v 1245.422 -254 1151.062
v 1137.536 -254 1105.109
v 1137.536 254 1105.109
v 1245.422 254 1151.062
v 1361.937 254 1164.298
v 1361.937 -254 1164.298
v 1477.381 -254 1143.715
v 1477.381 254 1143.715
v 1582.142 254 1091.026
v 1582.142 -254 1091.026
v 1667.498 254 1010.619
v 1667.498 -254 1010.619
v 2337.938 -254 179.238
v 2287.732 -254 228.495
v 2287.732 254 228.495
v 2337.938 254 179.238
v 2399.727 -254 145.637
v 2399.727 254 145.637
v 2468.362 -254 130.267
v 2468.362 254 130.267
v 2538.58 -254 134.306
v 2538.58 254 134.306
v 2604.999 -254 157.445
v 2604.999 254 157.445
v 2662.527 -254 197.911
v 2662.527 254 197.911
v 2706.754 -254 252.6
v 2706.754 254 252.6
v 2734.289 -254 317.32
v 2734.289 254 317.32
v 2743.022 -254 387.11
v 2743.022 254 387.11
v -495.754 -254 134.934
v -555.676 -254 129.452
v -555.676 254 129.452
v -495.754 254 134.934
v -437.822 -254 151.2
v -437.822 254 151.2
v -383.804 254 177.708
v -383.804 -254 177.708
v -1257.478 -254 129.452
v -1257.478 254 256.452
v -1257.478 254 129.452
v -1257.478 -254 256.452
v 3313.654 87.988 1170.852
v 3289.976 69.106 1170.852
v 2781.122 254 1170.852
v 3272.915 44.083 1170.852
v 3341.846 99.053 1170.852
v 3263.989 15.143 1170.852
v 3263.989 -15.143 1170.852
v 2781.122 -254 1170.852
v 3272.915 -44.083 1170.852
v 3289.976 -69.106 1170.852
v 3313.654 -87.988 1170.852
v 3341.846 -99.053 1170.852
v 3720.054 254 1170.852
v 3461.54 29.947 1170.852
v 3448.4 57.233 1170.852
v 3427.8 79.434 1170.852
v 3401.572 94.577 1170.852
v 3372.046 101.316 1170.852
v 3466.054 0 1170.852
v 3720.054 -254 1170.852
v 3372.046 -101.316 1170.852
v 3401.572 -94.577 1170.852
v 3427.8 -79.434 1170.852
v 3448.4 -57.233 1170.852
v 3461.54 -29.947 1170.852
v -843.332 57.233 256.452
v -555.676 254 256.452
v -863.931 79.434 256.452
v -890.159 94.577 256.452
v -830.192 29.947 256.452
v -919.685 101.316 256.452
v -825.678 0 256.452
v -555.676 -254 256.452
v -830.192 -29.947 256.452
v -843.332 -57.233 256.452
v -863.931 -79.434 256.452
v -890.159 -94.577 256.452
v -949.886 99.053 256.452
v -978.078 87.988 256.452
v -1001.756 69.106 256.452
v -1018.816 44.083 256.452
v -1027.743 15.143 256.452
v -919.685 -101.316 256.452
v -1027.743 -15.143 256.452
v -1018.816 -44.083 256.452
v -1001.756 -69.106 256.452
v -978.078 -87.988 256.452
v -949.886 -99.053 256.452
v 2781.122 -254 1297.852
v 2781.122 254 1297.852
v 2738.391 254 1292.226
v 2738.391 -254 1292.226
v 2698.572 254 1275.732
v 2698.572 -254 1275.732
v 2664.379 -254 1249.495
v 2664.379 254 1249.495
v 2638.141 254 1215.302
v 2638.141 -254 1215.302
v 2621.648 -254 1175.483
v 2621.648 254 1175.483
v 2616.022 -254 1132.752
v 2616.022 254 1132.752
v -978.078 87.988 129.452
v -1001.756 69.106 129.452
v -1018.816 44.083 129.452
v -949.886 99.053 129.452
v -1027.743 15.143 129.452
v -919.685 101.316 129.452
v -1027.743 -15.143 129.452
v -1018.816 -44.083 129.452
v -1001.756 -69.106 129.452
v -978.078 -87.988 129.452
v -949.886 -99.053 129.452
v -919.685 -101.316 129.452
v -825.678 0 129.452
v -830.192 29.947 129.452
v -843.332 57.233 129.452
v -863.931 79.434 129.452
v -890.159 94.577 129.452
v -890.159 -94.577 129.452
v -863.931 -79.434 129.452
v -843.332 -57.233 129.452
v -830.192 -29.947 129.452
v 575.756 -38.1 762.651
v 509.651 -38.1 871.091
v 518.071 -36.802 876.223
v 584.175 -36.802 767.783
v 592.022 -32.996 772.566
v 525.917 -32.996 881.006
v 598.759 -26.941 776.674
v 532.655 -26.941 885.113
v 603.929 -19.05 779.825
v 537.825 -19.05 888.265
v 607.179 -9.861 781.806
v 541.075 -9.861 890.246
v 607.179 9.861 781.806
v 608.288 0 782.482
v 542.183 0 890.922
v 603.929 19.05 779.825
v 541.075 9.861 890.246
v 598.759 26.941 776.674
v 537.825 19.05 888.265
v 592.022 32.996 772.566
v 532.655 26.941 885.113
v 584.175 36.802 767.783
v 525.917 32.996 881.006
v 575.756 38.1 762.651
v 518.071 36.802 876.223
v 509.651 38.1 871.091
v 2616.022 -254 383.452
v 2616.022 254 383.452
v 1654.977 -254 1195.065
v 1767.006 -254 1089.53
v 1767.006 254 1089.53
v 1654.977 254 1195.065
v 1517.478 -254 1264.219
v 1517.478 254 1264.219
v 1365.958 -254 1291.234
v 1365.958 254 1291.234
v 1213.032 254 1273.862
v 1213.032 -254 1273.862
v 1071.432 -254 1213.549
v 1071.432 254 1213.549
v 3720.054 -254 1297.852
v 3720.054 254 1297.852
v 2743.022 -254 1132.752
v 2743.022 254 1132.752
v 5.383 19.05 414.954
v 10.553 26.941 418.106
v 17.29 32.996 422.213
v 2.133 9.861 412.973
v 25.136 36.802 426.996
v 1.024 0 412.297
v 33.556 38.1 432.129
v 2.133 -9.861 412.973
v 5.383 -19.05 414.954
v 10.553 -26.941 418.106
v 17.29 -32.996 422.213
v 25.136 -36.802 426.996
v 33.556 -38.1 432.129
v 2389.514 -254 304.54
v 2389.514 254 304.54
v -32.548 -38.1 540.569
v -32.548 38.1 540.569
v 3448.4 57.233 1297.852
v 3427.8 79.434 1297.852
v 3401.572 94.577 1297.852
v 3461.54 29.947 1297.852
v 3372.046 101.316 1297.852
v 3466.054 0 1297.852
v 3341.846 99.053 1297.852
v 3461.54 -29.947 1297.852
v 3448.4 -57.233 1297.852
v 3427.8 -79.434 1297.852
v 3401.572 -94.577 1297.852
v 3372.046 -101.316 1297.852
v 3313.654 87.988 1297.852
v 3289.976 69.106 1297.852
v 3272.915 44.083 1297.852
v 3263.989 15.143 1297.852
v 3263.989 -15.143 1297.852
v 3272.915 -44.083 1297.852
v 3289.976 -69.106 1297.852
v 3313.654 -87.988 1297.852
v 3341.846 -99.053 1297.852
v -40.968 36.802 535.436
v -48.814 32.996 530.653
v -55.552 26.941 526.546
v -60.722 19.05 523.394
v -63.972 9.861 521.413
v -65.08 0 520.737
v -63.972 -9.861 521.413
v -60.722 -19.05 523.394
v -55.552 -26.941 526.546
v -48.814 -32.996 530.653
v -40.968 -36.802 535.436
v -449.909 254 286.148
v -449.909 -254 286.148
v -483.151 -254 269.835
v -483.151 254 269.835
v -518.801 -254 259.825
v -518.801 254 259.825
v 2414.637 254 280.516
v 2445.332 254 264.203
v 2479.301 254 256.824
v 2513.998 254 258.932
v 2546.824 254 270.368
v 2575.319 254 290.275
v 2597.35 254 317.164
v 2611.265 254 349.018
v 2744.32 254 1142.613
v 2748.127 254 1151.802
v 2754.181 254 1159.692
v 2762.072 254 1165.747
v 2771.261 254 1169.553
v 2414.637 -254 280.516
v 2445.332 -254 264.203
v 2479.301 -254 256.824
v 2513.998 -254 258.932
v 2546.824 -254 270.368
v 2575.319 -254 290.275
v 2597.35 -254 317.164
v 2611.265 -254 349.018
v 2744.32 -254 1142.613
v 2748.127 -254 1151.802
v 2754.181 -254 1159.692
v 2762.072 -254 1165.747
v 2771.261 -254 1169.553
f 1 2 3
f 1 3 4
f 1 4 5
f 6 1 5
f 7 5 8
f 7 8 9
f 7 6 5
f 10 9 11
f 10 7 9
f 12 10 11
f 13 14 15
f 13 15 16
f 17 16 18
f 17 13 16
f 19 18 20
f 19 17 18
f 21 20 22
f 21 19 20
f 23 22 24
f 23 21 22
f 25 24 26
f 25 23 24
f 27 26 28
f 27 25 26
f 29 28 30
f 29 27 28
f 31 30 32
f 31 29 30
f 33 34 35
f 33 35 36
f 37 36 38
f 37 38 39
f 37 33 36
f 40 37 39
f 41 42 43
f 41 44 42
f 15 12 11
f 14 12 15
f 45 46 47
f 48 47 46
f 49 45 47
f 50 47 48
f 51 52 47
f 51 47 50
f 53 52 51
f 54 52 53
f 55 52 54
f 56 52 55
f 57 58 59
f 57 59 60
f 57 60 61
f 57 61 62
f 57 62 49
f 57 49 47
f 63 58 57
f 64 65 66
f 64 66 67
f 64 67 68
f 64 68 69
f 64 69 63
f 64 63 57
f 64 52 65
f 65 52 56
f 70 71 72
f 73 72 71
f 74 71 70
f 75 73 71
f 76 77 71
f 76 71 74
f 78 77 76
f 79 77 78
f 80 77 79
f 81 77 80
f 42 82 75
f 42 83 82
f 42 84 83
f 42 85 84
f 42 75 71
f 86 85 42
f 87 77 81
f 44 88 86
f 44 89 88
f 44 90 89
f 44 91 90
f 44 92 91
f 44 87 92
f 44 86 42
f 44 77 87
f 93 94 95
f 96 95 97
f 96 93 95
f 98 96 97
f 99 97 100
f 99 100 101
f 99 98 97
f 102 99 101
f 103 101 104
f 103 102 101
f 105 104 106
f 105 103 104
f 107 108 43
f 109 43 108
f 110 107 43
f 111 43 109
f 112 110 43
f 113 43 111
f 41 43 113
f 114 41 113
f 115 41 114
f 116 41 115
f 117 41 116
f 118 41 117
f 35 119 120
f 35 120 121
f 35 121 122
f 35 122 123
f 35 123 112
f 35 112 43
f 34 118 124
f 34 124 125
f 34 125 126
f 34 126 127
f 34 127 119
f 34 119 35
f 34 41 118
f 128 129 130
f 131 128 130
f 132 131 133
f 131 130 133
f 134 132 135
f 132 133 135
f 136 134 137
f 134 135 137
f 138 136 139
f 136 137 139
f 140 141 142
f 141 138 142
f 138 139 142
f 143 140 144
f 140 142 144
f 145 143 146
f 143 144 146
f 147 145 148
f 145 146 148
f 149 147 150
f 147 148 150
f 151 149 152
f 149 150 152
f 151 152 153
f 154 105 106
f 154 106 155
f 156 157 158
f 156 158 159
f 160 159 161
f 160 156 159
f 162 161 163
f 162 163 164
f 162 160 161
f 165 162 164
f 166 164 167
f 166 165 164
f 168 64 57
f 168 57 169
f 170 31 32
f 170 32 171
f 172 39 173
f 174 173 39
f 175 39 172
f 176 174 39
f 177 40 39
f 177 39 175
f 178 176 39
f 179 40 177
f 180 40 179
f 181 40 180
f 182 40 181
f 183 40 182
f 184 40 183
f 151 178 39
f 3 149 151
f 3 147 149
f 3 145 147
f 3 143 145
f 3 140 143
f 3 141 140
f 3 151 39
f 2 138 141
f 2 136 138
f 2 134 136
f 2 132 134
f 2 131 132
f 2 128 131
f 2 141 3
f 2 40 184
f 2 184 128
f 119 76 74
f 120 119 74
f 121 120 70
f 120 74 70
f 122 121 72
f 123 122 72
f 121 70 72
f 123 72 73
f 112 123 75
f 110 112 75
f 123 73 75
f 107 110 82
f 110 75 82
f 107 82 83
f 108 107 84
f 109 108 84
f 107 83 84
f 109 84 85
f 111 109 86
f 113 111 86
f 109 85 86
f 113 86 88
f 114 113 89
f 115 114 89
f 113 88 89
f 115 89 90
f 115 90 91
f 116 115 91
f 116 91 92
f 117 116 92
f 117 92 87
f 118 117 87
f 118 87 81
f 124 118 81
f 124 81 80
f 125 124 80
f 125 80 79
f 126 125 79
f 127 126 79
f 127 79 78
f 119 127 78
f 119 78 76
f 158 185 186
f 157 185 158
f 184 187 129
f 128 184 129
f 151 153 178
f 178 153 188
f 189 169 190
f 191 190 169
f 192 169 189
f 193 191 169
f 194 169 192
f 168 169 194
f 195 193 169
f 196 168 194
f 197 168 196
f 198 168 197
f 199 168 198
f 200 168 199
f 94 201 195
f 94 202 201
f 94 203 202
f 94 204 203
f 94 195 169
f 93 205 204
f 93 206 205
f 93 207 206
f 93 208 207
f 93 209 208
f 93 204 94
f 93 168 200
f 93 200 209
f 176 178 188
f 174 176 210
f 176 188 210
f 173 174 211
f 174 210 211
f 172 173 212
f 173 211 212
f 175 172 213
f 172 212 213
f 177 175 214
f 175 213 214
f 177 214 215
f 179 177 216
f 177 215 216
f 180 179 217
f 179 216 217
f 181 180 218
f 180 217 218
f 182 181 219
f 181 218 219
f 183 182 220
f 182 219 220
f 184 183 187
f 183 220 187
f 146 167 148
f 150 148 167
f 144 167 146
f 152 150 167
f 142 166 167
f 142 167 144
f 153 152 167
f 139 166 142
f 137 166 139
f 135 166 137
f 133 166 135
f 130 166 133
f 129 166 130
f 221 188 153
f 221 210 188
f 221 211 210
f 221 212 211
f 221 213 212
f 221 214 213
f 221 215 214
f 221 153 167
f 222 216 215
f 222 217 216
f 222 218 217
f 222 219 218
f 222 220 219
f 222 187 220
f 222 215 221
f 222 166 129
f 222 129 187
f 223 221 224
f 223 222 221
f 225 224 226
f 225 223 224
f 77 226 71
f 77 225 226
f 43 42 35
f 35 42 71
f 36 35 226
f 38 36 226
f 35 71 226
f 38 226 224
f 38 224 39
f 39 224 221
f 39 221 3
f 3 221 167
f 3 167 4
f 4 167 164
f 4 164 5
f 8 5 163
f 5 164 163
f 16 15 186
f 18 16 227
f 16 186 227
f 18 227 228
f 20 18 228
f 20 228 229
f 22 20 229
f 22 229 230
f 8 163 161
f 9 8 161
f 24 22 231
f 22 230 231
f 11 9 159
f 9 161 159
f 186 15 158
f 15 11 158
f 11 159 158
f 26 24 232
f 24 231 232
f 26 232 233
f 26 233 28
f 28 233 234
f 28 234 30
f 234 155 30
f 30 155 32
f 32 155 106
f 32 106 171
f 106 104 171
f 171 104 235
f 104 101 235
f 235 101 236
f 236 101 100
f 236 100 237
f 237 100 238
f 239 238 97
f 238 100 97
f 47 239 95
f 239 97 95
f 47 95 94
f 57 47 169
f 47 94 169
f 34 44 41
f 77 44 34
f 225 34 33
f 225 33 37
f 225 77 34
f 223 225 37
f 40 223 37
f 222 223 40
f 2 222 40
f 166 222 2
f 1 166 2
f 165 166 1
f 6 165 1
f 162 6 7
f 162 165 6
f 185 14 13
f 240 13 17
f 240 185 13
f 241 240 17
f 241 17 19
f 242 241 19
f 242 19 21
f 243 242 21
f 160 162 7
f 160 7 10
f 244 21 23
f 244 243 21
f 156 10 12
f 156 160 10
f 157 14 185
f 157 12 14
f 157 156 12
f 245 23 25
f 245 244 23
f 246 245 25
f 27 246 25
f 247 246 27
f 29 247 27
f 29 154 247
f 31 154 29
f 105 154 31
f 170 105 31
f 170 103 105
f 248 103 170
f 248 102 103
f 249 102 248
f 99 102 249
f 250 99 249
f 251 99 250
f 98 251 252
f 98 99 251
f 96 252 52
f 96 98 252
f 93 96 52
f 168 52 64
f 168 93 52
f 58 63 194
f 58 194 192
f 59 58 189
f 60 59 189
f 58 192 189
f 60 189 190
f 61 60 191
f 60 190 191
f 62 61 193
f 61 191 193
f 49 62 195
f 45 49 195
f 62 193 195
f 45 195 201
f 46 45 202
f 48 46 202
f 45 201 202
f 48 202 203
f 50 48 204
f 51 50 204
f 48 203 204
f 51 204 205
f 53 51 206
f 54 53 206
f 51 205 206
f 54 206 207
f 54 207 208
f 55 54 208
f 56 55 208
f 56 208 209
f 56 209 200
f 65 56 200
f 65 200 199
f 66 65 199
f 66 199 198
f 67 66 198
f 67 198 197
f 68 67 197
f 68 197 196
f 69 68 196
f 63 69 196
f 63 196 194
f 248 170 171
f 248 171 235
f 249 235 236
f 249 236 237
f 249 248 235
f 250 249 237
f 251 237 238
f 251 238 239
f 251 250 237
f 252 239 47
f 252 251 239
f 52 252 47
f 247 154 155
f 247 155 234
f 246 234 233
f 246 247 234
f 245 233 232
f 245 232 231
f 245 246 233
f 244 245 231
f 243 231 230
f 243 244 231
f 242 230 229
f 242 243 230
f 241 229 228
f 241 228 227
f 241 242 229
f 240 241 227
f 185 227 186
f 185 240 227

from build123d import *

# Parameters (mm, degrees)
F1_DEPTH = 254
F2_R     = 101.6
F3_DEPTH = 127.027347
F4_R     = 101.6
F5_DEPTH = 1168.427347
F7_DEPTH = 2304.314569


with BuildPart() as f1:
    # F0 (on Front) → F1 (new body, symmetric)
    with BuildSketch(Plane.XZ):
        with BuildLine():
            Line((-1257.477762, 256.451588), (-1257.477762, 129.451588))
            Line((-1257.477762, 129.451588), (-555.675762, 129.451588))
            ThreePointArc((-555.675762, 129.451588), (-466.417067, 141.744486), (-383.804332, 177.707885))
            Line((-383.804332, 177.707885), (1137.536171, 1105.109222))
            ThreePointArc((1137.536171, 1105.109222), (1420.405142, 1158.191942), (1667.497755, 1010.61867))
            Line((1667.497755, 1010.61867), (2287.731793, 228.495009))
            ThreePointArc((2287.731793, 228.495009), (2572.594151, 143.565948), (2743.022238, 387.110144))
            Line((2743.022238, 387.110144), (2743.022238, 1132.751588))
            ThreePointArc((2743.022238, 1132.751588), (2754.18147, 1159.692356), (2781.122238, 1170.851588))
            Line((2781.122238, 1170.851588), (3720.053734, 1170.851588))
            Line((3720.053734, 1170.851588), (3720.053734, 1297.851588))
            Line((3720.053734, 1297.851588), (2831.053734, 1297.851588))
            Line((2831.053734, 1297.851588), (2781.122238, 1297.851588))
            ThreePointArc((2781.122238, 1297.851588), (2664.378909, 1249.494918), (2616.022238, 1132.751588))
            Line((2616.022238, 1132.751588), (2616.022238, 383.451588))
            ThreePointArc((2616.022238, 383.451588), (2530.803861, 263.521208), (2389.513639, 304.54))
            Line((2389.513639, 304.54), (1767.006354, 1089.530258))
            ThreePointArc((1767.006354, 1089.530258), (1442.6973, 1283.220178), (1071.431775, 1213.549108))
            Line((1071.431775, 1213.549108), (-449.908728, 286.147771))
            ThreePointArc((-449.908728, 286.147771), (-500.747334, 264.016448), (-555.675762, 256.451588))
            Line((-555.675762, 256.451588), (-1257.477762, 256.451588))
        make_face()
    extrude(amount=F1_DEPTH, both=True)

    # F2 (on face) → F3 (cut, through all)
    with BuildSketch(Plane.XY.offset(256.451588)):
        with Locations((-927.277762, 0)):
            Circle(F2_R)
        with Locations((3364.453734, 0)):
            Circle(F2_R)
    extrude(amount=-F3_DEPTH, mode=Mode.SUBTRACT)

    # F4 (on face) → F5 (cut, through all)
    with BuildSketch(Plane.XY.offset(1297.851588)):
        with Locations((3364.453734, 0)):
            Circle(F4_R)
    extrude(amount=-F5_DEPTH, mode=Mode.SUBTRACT)

    # F6 (on face) → F7 (cut, through all)
    with BuildSketch(Plane(origin=(-249.067857, 0, 408.579332), x_dir=(0.853857, 0, 0.520507), z_dir=(-0.520507, 0, 0.853857))):
        with BuildLine():
            Line((888.578209, 38.1), (253.578209, 38.1))
            ThreePointArc((253.578209, 38.1), (215.478209, 0), (253.578209, -38.1))
            Line((253.578209, -38.1), (888.578209, -38.1))
            ThreePointArc((888.578209, -38.1), (926.678209, 0), (888.578209, 38.1))
        make_face()
    extrude(amount=-F7_DEPTH, mode=Mode.SUBTRACT)


solid = f1.part
